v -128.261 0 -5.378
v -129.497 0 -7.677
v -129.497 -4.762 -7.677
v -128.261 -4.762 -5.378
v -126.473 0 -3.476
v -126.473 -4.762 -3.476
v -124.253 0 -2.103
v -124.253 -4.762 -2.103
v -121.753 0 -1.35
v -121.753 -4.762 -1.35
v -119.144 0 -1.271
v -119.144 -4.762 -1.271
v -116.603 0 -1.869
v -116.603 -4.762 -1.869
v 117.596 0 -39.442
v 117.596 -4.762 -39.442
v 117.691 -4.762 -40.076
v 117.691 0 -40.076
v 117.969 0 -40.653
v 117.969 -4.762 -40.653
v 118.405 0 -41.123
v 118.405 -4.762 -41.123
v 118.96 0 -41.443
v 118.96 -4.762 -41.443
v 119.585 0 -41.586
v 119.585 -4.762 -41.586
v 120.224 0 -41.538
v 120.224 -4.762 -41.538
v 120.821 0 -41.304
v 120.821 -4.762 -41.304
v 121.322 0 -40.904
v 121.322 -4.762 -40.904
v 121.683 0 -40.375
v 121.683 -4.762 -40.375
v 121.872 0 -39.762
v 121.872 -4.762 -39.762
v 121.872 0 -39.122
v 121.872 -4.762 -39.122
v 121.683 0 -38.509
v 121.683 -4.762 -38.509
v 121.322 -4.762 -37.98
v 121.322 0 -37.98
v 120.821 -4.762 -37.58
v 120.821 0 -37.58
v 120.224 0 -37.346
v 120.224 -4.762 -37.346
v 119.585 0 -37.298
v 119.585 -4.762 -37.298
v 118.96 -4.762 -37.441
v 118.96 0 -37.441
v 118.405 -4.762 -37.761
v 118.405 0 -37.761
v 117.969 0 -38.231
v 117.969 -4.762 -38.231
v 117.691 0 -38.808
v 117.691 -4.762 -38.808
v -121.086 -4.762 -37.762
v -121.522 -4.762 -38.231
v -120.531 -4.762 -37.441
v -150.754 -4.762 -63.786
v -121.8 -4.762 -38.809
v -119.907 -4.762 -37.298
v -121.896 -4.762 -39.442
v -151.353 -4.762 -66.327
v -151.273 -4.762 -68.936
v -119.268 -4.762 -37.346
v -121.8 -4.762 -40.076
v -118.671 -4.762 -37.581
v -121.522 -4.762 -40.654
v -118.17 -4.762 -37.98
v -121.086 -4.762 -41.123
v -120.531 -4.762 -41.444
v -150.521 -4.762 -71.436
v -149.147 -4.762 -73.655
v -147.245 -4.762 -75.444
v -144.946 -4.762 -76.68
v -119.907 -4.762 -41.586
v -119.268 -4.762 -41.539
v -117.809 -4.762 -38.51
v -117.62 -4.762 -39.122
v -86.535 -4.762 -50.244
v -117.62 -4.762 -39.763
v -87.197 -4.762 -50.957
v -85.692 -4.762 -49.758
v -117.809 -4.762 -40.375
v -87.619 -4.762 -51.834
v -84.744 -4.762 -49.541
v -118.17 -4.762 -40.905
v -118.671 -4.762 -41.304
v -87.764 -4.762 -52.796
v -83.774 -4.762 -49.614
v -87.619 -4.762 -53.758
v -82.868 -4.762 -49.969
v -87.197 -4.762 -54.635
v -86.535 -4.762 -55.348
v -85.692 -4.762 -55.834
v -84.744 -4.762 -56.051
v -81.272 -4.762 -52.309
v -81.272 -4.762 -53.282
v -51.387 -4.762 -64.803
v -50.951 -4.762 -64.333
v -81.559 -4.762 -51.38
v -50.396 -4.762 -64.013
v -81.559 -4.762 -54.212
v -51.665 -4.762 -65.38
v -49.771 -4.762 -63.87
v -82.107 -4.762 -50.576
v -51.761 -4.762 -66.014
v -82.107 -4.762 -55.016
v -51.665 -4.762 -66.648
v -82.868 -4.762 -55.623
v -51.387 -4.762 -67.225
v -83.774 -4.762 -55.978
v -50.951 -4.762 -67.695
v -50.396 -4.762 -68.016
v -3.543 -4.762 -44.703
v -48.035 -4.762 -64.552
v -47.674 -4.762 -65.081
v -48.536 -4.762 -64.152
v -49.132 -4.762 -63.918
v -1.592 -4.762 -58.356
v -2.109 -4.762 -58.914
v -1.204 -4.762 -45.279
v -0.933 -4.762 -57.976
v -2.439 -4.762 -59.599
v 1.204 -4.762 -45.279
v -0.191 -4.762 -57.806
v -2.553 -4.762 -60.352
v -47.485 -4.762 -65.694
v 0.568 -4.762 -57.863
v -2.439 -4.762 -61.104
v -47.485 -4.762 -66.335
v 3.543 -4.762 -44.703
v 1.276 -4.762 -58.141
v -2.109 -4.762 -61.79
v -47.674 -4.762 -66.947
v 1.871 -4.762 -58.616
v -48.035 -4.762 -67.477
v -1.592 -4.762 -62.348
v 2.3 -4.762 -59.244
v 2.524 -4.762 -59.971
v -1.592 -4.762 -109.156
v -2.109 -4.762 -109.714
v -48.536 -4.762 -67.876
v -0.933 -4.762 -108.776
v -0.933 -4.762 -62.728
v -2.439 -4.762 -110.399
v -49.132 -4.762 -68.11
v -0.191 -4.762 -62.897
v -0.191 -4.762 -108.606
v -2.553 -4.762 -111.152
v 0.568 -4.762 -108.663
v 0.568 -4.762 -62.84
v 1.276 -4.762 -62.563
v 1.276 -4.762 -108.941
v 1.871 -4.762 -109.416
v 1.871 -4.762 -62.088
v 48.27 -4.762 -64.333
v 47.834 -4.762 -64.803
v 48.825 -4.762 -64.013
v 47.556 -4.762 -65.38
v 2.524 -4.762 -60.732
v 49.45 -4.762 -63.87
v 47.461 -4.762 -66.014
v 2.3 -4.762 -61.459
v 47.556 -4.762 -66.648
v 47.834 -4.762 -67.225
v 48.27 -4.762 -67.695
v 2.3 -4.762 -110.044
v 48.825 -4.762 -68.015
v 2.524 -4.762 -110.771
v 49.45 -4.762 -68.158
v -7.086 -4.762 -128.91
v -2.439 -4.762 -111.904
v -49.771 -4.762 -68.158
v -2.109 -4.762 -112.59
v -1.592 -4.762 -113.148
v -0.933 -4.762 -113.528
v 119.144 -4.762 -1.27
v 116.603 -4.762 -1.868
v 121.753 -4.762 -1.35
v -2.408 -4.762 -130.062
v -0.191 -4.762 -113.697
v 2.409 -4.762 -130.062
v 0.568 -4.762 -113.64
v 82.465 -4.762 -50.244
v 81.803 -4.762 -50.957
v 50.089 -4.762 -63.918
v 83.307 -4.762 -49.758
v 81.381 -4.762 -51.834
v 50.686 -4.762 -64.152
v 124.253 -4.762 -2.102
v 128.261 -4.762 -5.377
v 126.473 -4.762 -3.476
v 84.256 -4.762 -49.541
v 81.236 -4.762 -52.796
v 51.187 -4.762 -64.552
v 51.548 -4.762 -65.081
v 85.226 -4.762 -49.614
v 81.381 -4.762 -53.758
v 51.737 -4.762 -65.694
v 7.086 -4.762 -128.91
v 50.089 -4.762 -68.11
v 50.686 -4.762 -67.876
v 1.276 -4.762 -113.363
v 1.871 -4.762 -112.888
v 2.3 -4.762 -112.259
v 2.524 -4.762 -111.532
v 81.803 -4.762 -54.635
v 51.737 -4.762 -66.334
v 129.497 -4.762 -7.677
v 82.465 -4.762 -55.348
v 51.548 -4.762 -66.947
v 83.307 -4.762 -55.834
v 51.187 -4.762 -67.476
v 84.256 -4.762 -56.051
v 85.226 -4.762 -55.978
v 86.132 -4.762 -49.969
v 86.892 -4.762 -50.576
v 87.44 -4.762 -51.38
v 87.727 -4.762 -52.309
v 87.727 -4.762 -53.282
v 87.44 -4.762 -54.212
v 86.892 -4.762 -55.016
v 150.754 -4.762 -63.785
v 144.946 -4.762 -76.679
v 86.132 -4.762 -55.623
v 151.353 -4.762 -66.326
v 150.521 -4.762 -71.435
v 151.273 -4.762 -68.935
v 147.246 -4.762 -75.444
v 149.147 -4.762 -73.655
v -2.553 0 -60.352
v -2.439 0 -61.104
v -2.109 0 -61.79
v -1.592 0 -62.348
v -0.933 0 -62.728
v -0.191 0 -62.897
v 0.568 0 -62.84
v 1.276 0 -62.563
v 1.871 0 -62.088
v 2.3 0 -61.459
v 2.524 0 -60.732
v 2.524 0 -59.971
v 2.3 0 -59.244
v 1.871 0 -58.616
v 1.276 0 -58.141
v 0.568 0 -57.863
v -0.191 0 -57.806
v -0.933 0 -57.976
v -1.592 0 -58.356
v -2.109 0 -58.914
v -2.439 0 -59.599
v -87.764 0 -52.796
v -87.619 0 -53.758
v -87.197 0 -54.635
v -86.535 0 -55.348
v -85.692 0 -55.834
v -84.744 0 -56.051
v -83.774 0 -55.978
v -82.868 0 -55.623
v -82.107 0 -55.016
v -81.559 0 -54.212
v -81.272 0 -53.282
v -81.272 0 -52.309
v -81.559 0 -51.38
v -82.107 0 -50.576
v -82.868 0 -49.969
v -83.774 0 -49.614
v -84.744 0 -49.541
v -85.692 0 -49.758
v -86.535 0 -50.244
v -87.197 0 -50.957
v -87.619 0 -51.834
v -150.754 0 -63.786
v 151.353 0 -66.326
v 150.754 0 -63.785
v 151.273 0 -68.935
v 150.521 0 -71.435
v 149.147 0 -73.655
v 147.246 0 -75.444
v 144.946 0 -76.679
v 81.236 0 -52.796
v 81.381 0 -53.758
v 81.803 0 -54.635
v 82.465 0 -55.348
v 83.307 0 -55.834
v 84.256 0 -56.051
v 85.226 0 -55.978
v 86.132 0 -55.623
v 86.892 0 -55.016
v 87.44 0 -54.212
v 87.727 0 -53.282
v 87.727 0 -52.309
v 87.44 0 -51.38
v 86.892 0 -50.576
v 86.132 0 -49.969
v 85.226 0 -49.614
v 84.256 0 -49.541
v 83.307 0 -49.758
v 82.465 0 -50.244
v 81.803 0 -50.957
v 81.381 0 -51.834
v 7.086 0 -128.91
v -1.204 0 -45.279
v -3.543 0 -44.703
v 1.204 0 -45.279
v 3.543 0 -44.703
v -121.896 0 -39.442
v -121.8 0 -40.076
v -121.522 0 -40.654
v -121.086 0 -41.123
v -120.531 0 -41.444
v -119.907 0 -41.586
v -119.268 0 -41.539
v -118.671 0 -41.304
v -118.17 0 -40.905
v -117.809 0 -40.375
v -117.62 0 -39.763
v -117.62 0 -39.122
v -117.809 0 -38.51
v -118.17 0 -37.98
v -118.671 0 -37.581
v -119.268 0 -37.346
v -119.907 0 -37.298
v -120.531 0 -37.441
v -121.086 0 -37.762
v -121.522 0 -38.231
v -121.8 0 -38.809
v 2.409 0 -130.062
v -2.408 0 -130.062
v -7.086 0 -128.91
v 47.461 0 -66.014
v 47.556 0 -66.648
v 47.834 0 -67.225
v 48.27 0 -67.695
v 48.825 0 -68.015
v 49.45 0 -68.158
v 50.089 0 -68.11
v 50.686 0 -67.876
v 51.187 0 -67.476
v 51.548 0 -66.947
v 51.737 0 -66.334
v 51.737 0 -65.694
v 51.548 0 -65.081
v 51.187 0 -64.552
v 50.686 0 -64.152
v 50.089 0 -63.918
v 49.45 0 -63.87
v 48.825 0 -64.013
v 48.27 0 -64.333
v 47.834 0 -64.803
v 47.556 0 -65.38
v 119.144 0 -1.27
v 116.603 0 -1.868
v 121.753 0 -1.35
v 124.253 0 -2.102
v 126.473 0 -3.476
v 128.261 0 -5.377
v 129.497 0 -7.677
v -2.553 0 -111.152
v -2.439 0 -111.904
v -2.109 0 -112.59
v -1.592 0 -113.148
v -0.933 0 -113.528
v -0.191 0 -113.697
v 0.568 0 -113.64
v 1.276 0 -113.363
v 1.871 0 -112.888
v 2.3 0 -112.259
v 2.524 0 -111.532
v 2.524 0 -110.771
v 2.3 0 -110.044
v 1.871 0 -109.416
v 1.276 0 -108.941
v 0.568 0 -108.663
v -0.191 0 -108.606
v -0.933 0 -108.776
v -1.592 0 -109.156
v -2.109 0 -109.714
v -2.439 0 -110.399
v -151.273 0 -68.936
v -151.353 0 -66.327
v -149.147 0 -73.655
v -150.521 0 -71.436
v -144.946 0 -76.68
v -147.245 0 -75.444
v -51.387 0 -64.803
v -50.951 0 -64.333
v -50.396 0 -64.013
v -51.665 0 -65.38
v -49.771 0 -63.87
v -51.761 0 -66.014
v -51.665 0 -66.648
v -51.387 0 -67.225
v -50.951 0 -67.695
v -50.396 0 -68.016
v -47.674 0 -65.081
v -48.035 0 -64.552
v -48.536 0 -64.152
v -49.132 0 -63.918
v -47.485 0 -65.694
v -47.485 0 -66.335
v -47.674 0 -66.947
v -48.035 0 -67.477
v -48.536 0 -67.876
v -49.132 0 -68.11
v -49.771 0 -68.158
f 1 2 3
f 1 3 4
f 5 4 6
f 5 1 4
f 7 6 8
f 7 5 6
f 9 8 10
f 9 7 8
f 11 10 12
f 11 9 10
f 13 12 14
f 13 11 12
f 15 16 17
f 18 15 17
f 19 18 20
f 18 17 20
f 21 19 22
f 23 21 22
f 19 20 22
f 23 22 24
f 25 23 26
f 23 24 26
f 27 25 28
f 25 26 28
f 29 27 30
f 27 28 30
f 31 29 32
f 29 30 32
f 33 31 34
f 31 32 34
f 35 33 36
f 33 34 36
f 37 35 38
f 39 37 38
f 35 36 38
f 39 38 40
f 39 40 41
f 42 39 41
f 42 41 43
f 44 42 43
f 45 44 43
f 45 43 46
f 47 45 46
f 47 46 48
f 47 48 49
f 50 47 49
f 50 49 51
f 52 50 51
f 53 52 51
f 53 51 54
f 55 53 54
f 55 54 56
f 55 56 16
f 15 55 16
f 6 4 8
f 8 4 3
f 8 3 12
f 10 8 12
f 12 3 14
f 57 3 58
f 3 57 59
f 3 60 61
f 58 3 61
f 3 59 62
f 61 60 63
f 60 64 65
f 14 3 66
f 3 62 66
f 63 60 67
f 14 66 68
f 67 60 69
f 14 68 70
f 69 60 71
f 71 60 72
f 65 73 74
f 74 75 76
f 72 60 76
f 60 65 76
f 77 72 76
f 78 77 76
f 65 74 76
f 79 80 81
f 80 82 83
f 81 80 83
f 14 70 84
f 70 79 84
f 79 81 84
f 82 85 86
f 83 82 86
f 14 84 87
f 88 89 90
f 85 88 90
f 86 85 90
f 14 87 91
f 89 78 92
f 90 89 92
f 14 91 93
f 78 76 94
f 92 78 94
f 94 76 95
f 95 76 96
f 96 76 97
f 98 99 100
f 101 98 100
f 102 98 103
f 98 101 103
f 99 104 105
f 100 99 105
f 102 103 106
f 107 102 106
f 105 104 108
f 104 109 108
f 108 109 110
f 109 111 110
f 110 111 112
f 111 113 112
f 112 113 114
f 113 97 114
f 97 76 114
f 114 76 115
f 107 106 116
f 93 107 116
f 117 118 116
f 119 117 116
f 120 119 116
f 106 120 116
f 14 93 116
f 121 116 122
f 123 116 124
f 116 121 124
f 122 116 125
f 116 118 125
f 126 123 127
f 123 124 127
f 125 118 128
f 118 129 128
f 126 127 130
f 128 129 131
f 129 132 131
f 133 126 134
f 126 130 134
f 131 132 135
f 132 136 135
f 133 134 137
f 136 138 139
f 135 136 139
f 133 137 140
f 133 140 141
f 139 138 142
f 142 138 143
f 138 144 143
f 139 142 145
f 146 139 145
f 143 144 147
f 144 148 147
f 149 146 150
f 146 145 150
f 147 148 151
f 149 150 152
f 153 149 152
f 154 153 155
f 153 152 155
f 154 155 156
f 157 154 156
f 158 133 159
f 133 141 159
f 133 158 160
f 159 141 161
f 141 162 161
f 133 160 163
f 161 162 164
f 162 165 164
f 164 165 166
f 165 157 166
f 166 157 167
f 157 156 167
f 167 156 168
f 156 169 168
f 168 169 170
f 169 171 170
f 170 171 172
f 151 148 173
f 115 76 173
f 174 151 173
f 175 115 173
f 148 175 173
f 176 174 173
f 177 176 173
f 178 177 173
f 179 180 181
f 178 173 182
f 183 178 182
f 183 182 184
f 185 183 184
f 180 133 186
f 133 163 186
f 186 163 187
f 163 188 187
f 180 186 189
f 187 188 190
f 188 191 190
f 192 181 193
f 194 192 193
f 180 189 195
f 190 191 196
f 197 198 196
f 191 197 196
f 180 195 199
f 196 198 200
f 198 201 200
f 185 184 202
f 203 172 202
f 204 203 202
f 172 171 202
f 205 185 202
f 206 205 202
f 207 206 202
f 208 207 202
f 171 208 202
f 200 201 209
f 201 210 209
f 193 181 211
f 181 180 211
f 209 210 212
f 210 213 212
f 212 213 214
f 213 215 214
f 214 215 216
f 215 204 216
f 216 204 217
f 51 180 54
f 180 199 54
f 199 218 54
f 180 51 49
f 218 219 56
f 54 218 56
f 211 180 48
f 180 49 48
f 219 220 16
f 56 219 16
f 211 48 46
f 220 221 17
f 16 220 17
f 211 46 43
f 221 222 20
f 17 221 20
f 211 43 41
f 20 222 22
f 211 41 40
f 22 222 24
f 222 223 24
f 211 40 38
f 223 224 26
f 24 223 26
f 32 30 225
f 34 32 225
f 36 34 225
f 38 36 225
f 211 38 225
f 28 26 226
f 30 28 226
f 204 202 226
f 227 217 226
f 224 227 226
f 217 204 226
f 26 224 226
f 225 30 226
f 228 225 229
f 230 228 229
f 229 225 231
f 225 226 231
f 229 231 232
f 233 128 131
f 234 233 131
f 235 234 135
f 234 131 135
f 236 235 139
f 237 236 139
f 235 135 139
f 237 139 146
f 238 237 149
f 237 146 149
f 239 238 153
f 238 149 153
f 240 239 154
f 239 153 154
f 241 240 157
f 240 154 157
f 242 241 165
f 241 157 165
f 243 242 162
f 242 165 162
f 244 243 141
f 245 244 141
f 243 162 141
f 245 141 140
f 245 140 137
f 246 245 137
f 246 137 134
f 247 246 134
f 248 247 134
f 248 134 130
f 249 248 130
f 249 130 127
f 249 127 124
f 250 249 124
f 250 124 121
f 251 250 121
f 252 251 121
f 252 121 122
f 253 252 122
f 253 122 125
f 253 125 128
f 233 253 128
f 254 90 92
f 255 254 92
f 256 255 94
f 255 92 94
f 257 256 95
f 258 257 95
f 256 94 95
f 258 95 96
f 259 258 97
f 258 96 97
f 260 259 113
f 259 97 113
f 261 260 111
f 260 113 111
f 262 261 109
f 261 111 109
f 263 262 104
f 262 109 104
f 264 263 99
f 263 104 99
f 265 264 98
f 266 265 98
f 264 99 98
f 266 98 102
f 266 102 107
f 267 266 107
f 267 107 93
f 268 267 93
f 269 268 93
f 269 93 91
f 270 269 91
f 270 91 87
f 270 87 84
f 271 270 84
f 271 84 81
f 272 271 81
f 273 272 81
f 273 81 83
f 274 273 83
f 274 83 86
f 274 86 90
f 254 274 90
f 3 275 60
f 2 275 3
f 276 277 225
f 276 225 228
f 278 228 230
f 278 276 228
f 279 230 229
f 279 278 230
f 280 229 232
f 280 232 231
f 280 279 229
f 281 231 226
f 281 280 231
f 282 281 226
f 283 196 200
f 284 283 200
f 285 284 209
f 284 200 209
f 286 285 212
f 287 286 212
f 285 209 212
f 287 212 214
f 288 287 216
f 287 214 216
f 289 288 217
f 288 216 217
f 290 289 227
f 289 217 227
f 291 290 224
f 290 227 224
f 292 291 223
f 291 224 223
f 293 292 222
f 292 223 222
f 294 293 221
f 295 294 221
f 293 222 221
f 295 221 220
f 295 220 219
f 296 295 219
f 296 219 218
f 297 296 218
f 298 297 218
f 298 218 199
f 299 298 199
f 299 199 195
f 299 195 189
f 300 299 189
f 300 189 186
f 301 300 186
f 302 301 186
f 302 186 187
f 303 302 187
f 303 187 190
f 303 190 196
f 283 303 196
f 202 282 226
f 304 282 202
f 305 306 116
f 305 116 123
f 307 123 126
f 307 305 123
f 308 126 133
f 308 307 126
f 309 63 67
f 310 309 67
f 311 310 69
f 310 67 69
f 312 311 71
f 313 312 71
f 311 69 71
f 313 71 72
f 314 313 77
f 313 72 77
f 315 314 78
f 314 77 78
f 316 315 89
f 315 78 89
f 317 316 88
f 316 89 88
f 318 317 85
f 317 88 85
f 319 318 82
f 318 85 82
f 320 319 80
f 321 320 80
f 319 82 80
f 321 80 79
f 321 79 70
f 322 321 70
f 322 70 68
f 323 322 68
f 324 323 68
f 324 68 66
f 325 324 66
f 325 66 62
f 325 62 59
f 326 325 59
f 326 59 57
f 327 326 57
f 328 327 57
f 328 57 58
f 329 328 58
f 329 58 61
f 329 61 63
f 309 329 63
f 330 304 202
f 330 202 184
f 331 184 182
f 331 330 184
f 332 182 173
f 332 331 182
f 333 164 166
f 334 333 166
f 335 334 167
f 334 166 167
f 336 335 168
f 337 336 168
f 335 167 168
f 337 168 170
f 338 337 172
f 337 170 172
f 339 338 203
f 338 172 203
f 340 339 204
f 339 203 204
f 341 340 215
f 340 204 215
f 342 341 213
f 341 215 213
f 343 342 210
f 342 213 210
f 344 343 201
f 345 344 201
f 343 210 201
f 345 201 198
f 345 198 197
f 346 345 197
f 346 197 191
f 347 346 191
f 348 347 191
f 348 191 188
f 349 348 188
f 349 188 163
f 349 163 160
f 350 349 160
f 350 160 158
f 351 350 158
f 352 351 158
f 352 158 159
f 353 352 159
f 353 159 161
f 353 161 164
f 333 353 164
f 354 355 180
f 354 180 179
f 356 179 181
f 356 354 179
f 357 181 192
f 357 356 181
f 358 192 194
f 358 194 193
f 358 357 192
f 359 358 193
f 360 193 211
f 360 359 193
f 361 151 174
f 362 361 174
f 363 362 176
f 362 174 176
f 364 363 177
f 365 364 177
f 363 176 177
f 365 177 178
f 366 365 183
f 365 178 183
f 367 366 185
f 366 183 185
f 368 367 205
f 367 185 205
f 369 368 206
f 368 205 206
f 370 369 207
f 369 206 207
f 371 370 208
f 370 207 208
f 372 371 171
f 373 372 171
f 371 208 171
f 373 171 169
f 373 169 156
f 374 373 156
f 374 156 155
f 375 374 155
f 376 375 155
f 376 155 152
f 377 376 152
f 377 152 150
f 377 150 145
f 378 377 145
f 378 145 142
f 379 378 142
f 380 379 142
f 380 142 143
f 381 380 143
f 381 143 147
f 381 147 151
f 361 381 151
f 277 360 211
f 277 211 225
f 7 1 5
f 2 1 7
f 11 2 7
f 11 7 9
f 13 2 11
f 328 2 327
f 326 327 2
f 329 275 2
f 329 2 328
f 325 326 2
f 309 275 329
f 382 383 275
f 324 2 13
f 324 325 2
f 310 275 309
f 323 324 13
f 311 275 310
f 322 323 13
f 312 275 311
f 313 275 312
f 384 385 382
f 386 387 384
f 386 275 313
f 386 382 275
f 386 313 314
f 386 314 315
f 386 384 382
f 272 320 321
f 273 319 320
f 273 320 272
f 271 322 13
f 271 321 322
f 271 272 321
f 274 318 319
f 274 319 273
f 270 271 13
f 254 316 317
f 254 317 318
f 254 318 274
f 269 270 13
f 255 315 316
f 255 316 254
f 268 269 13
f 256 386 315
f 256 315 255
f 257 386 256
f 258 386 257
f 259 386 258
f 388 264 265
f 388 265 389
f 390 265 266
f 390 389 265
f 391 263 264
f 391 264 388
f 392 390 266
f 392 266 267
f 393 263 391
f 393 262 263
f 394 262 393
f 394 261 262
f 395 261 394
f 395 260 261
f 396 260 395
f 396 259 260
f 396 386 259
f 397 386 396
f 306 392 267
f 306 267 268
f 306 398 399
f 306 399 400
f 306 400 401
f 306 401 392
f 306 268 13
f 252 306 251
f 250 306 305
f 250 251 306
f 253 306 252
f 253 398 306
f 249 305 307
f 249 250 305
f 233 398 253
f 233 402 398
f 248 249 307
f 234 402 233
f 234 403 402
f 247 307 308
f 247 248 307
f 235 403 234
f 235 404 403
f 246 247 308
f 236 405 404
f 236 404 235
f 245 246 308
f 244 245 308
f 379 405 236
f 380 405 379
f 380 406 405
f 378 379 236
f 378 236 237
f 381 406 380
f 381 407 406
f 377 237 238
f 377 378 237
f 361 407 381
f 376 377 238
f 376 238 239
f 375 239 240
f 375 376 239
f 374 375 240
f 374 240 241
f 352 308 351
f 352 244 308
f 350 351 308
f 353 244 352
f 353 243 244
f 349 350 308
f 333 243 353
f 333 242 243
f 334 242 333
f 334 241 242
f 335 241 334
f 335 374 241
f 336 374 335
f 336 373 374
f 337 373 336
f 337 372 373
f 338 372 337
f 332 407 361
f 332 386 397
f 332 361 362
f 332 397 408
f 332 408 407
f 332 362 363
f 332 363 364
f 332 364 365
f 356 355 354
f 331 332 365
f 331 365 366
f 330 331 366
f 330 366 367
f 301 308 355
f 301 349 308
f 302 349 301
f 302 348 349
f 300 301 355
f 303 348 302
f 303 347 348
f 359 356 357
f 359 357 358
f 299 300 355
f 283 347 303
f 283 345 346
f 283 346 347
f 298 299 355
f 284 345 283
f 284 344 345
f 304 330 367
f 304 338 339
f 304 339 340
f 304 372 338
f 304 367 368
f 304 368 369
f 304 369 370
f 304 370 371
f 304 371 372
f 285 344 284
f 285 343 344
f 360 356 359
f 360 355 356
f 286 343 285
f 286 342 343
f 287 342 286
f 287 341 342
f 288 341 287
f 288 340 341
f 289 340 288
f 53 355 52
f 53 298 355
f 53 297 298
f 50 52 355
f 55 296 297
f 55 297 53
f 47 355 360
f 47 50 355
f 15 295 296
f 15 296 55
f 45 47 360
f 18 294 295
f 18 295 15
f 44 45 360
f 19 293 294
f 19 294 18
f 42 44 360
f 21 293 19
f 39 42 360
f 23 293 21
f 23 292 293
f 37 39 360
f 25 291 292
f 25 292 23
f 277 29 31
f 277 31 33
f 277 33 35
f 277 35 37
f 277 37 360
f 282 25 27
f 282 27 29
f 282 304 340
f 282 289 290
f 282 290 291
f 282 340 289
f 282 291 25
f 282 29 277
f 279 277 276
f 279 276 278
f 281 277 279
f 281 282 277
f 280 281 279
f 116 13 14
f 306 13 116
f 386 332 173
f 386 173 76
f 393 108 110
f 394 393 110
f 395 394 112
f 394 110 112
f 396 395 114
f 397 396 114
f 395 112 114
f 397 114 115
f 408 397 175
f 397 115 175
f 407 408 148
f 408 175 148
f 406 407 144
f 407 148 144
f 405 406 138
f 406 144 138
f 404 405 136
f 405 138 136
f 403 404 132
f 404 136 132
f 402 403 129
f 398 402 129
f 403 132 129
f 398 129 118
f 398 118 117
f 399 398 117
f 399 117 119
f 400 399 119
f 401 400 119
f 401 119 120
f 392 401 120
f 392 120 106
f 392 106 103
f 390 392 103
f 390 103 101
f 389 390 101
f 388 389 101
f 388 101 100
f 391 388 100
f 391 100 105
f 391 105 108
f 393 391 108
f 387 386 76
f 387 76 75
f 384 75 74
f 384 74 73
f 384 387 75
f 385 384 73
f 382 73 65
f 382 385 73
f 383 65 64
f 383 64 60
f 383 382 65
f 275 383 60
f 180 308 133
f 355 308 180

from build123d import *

# Parameters (mm, degrees)
BOSS_EXTRUDE1_DEPTH     = 4.7625
F_1_4_CLEARANCE_HOLE4_D = 6.5278
M4_CLEARANCE_HOLE1_D    = 4.3
F_1_4_20_TAPPED_HOLE1_D = 5.1054


with BuildPart() as part:
    # Sketch2 → Boss-Extrude1 (new body)
    with BuildSketch(Plane(origin=(0, 0, 0), x_dir=(1, 0, 0), z_dir=(0, 1, 0))):
        with BuildLine():
            Line((144.946020413, 76.679156198), (7.085990937, 128.90997287))
            ThreePointArc((7.085990937, 128.90997287), (0.000172842, 130.207283228), (-7.085650583, 128.910001974))
            Line((-7.085650583, 128.910001974), (-144.945894589, 76.679751543))
            ThreePointArc((-144.945894589, 76.679751543), (-150.520615414, 71.435599421), (-150.754362786, 63.785500995))
            Line((-150.754362786, 63.785500995), (-129.497015734, 7.677344758))
            ThreePointArc((-129.497015734, 7.677344758), (-124.252863612, 2.102623932), (-116.602765186, 1.86887656))
            Line((-116.602765186, 1.86887656), (-3.542913137, 44.703157239))
            ThreePointArc((-3.542913137, 44.703157239), (-1.425e-06, 45.351797866), (3.542907623, 44.703142687))
            Line((3.542907623, 44.703142687), (116.602583736, 1.868397631))
            ThreePointArc((116.602583736, 1.868397631), (124.252683122, 2.102113581), (129.496858142, 7.676812867))
            Line((129.496858142, 7.676812867), (150.75443565, 63.784881792))
            ThreePointArc((150.75443565, 63.784881792), (150.520719699, 71.434981178), (144.946020413, 76.679156198))
        make_face()
    extrude(amount=-BOSS_EXTRUDE1_DEPTH)

    # 1/4 Clearance Hole4 (through all)
    with Locations(Plane(origin=(0, 0, 0), x_dir=(1, 0, 0), z_dir=(0, 1, 0))):
        with Locations((84.499786461, 52.795924918), (-84.499851108, 52.795924918)):
            Hole(F_1_4_CLEARANCE_HOLE4_D / 2)

    # M4 Clearance Hole1 (through all)
    with Locations(Plane(origin=(0, 0, 0), x_dir=(1, 0, 0), z_dir=(0, 1, 0))):
        with Locations((-49.61075086, 66.014140629), (-119.745946152, 39.442456816), (49.610666218, 66.014000002), (119.745752362, 39.442028122)):
            Hole(M4_CLEARANCE_HOLE1_D / 2)

    # 1/4-20 Tapped Hole1 (through all)
    with Locations(Plane(origin=(0, 0, 0), x_dir=(1, 0, 0), z_dir=(0, 1, 0))):
        with Locations((-2.901e-06, 111.151797866), (-2.901e-06, 60.351797866)):
            Hole(F_1_4_20_TAPPED_HOLE1_D / 2)


solid = part.part
